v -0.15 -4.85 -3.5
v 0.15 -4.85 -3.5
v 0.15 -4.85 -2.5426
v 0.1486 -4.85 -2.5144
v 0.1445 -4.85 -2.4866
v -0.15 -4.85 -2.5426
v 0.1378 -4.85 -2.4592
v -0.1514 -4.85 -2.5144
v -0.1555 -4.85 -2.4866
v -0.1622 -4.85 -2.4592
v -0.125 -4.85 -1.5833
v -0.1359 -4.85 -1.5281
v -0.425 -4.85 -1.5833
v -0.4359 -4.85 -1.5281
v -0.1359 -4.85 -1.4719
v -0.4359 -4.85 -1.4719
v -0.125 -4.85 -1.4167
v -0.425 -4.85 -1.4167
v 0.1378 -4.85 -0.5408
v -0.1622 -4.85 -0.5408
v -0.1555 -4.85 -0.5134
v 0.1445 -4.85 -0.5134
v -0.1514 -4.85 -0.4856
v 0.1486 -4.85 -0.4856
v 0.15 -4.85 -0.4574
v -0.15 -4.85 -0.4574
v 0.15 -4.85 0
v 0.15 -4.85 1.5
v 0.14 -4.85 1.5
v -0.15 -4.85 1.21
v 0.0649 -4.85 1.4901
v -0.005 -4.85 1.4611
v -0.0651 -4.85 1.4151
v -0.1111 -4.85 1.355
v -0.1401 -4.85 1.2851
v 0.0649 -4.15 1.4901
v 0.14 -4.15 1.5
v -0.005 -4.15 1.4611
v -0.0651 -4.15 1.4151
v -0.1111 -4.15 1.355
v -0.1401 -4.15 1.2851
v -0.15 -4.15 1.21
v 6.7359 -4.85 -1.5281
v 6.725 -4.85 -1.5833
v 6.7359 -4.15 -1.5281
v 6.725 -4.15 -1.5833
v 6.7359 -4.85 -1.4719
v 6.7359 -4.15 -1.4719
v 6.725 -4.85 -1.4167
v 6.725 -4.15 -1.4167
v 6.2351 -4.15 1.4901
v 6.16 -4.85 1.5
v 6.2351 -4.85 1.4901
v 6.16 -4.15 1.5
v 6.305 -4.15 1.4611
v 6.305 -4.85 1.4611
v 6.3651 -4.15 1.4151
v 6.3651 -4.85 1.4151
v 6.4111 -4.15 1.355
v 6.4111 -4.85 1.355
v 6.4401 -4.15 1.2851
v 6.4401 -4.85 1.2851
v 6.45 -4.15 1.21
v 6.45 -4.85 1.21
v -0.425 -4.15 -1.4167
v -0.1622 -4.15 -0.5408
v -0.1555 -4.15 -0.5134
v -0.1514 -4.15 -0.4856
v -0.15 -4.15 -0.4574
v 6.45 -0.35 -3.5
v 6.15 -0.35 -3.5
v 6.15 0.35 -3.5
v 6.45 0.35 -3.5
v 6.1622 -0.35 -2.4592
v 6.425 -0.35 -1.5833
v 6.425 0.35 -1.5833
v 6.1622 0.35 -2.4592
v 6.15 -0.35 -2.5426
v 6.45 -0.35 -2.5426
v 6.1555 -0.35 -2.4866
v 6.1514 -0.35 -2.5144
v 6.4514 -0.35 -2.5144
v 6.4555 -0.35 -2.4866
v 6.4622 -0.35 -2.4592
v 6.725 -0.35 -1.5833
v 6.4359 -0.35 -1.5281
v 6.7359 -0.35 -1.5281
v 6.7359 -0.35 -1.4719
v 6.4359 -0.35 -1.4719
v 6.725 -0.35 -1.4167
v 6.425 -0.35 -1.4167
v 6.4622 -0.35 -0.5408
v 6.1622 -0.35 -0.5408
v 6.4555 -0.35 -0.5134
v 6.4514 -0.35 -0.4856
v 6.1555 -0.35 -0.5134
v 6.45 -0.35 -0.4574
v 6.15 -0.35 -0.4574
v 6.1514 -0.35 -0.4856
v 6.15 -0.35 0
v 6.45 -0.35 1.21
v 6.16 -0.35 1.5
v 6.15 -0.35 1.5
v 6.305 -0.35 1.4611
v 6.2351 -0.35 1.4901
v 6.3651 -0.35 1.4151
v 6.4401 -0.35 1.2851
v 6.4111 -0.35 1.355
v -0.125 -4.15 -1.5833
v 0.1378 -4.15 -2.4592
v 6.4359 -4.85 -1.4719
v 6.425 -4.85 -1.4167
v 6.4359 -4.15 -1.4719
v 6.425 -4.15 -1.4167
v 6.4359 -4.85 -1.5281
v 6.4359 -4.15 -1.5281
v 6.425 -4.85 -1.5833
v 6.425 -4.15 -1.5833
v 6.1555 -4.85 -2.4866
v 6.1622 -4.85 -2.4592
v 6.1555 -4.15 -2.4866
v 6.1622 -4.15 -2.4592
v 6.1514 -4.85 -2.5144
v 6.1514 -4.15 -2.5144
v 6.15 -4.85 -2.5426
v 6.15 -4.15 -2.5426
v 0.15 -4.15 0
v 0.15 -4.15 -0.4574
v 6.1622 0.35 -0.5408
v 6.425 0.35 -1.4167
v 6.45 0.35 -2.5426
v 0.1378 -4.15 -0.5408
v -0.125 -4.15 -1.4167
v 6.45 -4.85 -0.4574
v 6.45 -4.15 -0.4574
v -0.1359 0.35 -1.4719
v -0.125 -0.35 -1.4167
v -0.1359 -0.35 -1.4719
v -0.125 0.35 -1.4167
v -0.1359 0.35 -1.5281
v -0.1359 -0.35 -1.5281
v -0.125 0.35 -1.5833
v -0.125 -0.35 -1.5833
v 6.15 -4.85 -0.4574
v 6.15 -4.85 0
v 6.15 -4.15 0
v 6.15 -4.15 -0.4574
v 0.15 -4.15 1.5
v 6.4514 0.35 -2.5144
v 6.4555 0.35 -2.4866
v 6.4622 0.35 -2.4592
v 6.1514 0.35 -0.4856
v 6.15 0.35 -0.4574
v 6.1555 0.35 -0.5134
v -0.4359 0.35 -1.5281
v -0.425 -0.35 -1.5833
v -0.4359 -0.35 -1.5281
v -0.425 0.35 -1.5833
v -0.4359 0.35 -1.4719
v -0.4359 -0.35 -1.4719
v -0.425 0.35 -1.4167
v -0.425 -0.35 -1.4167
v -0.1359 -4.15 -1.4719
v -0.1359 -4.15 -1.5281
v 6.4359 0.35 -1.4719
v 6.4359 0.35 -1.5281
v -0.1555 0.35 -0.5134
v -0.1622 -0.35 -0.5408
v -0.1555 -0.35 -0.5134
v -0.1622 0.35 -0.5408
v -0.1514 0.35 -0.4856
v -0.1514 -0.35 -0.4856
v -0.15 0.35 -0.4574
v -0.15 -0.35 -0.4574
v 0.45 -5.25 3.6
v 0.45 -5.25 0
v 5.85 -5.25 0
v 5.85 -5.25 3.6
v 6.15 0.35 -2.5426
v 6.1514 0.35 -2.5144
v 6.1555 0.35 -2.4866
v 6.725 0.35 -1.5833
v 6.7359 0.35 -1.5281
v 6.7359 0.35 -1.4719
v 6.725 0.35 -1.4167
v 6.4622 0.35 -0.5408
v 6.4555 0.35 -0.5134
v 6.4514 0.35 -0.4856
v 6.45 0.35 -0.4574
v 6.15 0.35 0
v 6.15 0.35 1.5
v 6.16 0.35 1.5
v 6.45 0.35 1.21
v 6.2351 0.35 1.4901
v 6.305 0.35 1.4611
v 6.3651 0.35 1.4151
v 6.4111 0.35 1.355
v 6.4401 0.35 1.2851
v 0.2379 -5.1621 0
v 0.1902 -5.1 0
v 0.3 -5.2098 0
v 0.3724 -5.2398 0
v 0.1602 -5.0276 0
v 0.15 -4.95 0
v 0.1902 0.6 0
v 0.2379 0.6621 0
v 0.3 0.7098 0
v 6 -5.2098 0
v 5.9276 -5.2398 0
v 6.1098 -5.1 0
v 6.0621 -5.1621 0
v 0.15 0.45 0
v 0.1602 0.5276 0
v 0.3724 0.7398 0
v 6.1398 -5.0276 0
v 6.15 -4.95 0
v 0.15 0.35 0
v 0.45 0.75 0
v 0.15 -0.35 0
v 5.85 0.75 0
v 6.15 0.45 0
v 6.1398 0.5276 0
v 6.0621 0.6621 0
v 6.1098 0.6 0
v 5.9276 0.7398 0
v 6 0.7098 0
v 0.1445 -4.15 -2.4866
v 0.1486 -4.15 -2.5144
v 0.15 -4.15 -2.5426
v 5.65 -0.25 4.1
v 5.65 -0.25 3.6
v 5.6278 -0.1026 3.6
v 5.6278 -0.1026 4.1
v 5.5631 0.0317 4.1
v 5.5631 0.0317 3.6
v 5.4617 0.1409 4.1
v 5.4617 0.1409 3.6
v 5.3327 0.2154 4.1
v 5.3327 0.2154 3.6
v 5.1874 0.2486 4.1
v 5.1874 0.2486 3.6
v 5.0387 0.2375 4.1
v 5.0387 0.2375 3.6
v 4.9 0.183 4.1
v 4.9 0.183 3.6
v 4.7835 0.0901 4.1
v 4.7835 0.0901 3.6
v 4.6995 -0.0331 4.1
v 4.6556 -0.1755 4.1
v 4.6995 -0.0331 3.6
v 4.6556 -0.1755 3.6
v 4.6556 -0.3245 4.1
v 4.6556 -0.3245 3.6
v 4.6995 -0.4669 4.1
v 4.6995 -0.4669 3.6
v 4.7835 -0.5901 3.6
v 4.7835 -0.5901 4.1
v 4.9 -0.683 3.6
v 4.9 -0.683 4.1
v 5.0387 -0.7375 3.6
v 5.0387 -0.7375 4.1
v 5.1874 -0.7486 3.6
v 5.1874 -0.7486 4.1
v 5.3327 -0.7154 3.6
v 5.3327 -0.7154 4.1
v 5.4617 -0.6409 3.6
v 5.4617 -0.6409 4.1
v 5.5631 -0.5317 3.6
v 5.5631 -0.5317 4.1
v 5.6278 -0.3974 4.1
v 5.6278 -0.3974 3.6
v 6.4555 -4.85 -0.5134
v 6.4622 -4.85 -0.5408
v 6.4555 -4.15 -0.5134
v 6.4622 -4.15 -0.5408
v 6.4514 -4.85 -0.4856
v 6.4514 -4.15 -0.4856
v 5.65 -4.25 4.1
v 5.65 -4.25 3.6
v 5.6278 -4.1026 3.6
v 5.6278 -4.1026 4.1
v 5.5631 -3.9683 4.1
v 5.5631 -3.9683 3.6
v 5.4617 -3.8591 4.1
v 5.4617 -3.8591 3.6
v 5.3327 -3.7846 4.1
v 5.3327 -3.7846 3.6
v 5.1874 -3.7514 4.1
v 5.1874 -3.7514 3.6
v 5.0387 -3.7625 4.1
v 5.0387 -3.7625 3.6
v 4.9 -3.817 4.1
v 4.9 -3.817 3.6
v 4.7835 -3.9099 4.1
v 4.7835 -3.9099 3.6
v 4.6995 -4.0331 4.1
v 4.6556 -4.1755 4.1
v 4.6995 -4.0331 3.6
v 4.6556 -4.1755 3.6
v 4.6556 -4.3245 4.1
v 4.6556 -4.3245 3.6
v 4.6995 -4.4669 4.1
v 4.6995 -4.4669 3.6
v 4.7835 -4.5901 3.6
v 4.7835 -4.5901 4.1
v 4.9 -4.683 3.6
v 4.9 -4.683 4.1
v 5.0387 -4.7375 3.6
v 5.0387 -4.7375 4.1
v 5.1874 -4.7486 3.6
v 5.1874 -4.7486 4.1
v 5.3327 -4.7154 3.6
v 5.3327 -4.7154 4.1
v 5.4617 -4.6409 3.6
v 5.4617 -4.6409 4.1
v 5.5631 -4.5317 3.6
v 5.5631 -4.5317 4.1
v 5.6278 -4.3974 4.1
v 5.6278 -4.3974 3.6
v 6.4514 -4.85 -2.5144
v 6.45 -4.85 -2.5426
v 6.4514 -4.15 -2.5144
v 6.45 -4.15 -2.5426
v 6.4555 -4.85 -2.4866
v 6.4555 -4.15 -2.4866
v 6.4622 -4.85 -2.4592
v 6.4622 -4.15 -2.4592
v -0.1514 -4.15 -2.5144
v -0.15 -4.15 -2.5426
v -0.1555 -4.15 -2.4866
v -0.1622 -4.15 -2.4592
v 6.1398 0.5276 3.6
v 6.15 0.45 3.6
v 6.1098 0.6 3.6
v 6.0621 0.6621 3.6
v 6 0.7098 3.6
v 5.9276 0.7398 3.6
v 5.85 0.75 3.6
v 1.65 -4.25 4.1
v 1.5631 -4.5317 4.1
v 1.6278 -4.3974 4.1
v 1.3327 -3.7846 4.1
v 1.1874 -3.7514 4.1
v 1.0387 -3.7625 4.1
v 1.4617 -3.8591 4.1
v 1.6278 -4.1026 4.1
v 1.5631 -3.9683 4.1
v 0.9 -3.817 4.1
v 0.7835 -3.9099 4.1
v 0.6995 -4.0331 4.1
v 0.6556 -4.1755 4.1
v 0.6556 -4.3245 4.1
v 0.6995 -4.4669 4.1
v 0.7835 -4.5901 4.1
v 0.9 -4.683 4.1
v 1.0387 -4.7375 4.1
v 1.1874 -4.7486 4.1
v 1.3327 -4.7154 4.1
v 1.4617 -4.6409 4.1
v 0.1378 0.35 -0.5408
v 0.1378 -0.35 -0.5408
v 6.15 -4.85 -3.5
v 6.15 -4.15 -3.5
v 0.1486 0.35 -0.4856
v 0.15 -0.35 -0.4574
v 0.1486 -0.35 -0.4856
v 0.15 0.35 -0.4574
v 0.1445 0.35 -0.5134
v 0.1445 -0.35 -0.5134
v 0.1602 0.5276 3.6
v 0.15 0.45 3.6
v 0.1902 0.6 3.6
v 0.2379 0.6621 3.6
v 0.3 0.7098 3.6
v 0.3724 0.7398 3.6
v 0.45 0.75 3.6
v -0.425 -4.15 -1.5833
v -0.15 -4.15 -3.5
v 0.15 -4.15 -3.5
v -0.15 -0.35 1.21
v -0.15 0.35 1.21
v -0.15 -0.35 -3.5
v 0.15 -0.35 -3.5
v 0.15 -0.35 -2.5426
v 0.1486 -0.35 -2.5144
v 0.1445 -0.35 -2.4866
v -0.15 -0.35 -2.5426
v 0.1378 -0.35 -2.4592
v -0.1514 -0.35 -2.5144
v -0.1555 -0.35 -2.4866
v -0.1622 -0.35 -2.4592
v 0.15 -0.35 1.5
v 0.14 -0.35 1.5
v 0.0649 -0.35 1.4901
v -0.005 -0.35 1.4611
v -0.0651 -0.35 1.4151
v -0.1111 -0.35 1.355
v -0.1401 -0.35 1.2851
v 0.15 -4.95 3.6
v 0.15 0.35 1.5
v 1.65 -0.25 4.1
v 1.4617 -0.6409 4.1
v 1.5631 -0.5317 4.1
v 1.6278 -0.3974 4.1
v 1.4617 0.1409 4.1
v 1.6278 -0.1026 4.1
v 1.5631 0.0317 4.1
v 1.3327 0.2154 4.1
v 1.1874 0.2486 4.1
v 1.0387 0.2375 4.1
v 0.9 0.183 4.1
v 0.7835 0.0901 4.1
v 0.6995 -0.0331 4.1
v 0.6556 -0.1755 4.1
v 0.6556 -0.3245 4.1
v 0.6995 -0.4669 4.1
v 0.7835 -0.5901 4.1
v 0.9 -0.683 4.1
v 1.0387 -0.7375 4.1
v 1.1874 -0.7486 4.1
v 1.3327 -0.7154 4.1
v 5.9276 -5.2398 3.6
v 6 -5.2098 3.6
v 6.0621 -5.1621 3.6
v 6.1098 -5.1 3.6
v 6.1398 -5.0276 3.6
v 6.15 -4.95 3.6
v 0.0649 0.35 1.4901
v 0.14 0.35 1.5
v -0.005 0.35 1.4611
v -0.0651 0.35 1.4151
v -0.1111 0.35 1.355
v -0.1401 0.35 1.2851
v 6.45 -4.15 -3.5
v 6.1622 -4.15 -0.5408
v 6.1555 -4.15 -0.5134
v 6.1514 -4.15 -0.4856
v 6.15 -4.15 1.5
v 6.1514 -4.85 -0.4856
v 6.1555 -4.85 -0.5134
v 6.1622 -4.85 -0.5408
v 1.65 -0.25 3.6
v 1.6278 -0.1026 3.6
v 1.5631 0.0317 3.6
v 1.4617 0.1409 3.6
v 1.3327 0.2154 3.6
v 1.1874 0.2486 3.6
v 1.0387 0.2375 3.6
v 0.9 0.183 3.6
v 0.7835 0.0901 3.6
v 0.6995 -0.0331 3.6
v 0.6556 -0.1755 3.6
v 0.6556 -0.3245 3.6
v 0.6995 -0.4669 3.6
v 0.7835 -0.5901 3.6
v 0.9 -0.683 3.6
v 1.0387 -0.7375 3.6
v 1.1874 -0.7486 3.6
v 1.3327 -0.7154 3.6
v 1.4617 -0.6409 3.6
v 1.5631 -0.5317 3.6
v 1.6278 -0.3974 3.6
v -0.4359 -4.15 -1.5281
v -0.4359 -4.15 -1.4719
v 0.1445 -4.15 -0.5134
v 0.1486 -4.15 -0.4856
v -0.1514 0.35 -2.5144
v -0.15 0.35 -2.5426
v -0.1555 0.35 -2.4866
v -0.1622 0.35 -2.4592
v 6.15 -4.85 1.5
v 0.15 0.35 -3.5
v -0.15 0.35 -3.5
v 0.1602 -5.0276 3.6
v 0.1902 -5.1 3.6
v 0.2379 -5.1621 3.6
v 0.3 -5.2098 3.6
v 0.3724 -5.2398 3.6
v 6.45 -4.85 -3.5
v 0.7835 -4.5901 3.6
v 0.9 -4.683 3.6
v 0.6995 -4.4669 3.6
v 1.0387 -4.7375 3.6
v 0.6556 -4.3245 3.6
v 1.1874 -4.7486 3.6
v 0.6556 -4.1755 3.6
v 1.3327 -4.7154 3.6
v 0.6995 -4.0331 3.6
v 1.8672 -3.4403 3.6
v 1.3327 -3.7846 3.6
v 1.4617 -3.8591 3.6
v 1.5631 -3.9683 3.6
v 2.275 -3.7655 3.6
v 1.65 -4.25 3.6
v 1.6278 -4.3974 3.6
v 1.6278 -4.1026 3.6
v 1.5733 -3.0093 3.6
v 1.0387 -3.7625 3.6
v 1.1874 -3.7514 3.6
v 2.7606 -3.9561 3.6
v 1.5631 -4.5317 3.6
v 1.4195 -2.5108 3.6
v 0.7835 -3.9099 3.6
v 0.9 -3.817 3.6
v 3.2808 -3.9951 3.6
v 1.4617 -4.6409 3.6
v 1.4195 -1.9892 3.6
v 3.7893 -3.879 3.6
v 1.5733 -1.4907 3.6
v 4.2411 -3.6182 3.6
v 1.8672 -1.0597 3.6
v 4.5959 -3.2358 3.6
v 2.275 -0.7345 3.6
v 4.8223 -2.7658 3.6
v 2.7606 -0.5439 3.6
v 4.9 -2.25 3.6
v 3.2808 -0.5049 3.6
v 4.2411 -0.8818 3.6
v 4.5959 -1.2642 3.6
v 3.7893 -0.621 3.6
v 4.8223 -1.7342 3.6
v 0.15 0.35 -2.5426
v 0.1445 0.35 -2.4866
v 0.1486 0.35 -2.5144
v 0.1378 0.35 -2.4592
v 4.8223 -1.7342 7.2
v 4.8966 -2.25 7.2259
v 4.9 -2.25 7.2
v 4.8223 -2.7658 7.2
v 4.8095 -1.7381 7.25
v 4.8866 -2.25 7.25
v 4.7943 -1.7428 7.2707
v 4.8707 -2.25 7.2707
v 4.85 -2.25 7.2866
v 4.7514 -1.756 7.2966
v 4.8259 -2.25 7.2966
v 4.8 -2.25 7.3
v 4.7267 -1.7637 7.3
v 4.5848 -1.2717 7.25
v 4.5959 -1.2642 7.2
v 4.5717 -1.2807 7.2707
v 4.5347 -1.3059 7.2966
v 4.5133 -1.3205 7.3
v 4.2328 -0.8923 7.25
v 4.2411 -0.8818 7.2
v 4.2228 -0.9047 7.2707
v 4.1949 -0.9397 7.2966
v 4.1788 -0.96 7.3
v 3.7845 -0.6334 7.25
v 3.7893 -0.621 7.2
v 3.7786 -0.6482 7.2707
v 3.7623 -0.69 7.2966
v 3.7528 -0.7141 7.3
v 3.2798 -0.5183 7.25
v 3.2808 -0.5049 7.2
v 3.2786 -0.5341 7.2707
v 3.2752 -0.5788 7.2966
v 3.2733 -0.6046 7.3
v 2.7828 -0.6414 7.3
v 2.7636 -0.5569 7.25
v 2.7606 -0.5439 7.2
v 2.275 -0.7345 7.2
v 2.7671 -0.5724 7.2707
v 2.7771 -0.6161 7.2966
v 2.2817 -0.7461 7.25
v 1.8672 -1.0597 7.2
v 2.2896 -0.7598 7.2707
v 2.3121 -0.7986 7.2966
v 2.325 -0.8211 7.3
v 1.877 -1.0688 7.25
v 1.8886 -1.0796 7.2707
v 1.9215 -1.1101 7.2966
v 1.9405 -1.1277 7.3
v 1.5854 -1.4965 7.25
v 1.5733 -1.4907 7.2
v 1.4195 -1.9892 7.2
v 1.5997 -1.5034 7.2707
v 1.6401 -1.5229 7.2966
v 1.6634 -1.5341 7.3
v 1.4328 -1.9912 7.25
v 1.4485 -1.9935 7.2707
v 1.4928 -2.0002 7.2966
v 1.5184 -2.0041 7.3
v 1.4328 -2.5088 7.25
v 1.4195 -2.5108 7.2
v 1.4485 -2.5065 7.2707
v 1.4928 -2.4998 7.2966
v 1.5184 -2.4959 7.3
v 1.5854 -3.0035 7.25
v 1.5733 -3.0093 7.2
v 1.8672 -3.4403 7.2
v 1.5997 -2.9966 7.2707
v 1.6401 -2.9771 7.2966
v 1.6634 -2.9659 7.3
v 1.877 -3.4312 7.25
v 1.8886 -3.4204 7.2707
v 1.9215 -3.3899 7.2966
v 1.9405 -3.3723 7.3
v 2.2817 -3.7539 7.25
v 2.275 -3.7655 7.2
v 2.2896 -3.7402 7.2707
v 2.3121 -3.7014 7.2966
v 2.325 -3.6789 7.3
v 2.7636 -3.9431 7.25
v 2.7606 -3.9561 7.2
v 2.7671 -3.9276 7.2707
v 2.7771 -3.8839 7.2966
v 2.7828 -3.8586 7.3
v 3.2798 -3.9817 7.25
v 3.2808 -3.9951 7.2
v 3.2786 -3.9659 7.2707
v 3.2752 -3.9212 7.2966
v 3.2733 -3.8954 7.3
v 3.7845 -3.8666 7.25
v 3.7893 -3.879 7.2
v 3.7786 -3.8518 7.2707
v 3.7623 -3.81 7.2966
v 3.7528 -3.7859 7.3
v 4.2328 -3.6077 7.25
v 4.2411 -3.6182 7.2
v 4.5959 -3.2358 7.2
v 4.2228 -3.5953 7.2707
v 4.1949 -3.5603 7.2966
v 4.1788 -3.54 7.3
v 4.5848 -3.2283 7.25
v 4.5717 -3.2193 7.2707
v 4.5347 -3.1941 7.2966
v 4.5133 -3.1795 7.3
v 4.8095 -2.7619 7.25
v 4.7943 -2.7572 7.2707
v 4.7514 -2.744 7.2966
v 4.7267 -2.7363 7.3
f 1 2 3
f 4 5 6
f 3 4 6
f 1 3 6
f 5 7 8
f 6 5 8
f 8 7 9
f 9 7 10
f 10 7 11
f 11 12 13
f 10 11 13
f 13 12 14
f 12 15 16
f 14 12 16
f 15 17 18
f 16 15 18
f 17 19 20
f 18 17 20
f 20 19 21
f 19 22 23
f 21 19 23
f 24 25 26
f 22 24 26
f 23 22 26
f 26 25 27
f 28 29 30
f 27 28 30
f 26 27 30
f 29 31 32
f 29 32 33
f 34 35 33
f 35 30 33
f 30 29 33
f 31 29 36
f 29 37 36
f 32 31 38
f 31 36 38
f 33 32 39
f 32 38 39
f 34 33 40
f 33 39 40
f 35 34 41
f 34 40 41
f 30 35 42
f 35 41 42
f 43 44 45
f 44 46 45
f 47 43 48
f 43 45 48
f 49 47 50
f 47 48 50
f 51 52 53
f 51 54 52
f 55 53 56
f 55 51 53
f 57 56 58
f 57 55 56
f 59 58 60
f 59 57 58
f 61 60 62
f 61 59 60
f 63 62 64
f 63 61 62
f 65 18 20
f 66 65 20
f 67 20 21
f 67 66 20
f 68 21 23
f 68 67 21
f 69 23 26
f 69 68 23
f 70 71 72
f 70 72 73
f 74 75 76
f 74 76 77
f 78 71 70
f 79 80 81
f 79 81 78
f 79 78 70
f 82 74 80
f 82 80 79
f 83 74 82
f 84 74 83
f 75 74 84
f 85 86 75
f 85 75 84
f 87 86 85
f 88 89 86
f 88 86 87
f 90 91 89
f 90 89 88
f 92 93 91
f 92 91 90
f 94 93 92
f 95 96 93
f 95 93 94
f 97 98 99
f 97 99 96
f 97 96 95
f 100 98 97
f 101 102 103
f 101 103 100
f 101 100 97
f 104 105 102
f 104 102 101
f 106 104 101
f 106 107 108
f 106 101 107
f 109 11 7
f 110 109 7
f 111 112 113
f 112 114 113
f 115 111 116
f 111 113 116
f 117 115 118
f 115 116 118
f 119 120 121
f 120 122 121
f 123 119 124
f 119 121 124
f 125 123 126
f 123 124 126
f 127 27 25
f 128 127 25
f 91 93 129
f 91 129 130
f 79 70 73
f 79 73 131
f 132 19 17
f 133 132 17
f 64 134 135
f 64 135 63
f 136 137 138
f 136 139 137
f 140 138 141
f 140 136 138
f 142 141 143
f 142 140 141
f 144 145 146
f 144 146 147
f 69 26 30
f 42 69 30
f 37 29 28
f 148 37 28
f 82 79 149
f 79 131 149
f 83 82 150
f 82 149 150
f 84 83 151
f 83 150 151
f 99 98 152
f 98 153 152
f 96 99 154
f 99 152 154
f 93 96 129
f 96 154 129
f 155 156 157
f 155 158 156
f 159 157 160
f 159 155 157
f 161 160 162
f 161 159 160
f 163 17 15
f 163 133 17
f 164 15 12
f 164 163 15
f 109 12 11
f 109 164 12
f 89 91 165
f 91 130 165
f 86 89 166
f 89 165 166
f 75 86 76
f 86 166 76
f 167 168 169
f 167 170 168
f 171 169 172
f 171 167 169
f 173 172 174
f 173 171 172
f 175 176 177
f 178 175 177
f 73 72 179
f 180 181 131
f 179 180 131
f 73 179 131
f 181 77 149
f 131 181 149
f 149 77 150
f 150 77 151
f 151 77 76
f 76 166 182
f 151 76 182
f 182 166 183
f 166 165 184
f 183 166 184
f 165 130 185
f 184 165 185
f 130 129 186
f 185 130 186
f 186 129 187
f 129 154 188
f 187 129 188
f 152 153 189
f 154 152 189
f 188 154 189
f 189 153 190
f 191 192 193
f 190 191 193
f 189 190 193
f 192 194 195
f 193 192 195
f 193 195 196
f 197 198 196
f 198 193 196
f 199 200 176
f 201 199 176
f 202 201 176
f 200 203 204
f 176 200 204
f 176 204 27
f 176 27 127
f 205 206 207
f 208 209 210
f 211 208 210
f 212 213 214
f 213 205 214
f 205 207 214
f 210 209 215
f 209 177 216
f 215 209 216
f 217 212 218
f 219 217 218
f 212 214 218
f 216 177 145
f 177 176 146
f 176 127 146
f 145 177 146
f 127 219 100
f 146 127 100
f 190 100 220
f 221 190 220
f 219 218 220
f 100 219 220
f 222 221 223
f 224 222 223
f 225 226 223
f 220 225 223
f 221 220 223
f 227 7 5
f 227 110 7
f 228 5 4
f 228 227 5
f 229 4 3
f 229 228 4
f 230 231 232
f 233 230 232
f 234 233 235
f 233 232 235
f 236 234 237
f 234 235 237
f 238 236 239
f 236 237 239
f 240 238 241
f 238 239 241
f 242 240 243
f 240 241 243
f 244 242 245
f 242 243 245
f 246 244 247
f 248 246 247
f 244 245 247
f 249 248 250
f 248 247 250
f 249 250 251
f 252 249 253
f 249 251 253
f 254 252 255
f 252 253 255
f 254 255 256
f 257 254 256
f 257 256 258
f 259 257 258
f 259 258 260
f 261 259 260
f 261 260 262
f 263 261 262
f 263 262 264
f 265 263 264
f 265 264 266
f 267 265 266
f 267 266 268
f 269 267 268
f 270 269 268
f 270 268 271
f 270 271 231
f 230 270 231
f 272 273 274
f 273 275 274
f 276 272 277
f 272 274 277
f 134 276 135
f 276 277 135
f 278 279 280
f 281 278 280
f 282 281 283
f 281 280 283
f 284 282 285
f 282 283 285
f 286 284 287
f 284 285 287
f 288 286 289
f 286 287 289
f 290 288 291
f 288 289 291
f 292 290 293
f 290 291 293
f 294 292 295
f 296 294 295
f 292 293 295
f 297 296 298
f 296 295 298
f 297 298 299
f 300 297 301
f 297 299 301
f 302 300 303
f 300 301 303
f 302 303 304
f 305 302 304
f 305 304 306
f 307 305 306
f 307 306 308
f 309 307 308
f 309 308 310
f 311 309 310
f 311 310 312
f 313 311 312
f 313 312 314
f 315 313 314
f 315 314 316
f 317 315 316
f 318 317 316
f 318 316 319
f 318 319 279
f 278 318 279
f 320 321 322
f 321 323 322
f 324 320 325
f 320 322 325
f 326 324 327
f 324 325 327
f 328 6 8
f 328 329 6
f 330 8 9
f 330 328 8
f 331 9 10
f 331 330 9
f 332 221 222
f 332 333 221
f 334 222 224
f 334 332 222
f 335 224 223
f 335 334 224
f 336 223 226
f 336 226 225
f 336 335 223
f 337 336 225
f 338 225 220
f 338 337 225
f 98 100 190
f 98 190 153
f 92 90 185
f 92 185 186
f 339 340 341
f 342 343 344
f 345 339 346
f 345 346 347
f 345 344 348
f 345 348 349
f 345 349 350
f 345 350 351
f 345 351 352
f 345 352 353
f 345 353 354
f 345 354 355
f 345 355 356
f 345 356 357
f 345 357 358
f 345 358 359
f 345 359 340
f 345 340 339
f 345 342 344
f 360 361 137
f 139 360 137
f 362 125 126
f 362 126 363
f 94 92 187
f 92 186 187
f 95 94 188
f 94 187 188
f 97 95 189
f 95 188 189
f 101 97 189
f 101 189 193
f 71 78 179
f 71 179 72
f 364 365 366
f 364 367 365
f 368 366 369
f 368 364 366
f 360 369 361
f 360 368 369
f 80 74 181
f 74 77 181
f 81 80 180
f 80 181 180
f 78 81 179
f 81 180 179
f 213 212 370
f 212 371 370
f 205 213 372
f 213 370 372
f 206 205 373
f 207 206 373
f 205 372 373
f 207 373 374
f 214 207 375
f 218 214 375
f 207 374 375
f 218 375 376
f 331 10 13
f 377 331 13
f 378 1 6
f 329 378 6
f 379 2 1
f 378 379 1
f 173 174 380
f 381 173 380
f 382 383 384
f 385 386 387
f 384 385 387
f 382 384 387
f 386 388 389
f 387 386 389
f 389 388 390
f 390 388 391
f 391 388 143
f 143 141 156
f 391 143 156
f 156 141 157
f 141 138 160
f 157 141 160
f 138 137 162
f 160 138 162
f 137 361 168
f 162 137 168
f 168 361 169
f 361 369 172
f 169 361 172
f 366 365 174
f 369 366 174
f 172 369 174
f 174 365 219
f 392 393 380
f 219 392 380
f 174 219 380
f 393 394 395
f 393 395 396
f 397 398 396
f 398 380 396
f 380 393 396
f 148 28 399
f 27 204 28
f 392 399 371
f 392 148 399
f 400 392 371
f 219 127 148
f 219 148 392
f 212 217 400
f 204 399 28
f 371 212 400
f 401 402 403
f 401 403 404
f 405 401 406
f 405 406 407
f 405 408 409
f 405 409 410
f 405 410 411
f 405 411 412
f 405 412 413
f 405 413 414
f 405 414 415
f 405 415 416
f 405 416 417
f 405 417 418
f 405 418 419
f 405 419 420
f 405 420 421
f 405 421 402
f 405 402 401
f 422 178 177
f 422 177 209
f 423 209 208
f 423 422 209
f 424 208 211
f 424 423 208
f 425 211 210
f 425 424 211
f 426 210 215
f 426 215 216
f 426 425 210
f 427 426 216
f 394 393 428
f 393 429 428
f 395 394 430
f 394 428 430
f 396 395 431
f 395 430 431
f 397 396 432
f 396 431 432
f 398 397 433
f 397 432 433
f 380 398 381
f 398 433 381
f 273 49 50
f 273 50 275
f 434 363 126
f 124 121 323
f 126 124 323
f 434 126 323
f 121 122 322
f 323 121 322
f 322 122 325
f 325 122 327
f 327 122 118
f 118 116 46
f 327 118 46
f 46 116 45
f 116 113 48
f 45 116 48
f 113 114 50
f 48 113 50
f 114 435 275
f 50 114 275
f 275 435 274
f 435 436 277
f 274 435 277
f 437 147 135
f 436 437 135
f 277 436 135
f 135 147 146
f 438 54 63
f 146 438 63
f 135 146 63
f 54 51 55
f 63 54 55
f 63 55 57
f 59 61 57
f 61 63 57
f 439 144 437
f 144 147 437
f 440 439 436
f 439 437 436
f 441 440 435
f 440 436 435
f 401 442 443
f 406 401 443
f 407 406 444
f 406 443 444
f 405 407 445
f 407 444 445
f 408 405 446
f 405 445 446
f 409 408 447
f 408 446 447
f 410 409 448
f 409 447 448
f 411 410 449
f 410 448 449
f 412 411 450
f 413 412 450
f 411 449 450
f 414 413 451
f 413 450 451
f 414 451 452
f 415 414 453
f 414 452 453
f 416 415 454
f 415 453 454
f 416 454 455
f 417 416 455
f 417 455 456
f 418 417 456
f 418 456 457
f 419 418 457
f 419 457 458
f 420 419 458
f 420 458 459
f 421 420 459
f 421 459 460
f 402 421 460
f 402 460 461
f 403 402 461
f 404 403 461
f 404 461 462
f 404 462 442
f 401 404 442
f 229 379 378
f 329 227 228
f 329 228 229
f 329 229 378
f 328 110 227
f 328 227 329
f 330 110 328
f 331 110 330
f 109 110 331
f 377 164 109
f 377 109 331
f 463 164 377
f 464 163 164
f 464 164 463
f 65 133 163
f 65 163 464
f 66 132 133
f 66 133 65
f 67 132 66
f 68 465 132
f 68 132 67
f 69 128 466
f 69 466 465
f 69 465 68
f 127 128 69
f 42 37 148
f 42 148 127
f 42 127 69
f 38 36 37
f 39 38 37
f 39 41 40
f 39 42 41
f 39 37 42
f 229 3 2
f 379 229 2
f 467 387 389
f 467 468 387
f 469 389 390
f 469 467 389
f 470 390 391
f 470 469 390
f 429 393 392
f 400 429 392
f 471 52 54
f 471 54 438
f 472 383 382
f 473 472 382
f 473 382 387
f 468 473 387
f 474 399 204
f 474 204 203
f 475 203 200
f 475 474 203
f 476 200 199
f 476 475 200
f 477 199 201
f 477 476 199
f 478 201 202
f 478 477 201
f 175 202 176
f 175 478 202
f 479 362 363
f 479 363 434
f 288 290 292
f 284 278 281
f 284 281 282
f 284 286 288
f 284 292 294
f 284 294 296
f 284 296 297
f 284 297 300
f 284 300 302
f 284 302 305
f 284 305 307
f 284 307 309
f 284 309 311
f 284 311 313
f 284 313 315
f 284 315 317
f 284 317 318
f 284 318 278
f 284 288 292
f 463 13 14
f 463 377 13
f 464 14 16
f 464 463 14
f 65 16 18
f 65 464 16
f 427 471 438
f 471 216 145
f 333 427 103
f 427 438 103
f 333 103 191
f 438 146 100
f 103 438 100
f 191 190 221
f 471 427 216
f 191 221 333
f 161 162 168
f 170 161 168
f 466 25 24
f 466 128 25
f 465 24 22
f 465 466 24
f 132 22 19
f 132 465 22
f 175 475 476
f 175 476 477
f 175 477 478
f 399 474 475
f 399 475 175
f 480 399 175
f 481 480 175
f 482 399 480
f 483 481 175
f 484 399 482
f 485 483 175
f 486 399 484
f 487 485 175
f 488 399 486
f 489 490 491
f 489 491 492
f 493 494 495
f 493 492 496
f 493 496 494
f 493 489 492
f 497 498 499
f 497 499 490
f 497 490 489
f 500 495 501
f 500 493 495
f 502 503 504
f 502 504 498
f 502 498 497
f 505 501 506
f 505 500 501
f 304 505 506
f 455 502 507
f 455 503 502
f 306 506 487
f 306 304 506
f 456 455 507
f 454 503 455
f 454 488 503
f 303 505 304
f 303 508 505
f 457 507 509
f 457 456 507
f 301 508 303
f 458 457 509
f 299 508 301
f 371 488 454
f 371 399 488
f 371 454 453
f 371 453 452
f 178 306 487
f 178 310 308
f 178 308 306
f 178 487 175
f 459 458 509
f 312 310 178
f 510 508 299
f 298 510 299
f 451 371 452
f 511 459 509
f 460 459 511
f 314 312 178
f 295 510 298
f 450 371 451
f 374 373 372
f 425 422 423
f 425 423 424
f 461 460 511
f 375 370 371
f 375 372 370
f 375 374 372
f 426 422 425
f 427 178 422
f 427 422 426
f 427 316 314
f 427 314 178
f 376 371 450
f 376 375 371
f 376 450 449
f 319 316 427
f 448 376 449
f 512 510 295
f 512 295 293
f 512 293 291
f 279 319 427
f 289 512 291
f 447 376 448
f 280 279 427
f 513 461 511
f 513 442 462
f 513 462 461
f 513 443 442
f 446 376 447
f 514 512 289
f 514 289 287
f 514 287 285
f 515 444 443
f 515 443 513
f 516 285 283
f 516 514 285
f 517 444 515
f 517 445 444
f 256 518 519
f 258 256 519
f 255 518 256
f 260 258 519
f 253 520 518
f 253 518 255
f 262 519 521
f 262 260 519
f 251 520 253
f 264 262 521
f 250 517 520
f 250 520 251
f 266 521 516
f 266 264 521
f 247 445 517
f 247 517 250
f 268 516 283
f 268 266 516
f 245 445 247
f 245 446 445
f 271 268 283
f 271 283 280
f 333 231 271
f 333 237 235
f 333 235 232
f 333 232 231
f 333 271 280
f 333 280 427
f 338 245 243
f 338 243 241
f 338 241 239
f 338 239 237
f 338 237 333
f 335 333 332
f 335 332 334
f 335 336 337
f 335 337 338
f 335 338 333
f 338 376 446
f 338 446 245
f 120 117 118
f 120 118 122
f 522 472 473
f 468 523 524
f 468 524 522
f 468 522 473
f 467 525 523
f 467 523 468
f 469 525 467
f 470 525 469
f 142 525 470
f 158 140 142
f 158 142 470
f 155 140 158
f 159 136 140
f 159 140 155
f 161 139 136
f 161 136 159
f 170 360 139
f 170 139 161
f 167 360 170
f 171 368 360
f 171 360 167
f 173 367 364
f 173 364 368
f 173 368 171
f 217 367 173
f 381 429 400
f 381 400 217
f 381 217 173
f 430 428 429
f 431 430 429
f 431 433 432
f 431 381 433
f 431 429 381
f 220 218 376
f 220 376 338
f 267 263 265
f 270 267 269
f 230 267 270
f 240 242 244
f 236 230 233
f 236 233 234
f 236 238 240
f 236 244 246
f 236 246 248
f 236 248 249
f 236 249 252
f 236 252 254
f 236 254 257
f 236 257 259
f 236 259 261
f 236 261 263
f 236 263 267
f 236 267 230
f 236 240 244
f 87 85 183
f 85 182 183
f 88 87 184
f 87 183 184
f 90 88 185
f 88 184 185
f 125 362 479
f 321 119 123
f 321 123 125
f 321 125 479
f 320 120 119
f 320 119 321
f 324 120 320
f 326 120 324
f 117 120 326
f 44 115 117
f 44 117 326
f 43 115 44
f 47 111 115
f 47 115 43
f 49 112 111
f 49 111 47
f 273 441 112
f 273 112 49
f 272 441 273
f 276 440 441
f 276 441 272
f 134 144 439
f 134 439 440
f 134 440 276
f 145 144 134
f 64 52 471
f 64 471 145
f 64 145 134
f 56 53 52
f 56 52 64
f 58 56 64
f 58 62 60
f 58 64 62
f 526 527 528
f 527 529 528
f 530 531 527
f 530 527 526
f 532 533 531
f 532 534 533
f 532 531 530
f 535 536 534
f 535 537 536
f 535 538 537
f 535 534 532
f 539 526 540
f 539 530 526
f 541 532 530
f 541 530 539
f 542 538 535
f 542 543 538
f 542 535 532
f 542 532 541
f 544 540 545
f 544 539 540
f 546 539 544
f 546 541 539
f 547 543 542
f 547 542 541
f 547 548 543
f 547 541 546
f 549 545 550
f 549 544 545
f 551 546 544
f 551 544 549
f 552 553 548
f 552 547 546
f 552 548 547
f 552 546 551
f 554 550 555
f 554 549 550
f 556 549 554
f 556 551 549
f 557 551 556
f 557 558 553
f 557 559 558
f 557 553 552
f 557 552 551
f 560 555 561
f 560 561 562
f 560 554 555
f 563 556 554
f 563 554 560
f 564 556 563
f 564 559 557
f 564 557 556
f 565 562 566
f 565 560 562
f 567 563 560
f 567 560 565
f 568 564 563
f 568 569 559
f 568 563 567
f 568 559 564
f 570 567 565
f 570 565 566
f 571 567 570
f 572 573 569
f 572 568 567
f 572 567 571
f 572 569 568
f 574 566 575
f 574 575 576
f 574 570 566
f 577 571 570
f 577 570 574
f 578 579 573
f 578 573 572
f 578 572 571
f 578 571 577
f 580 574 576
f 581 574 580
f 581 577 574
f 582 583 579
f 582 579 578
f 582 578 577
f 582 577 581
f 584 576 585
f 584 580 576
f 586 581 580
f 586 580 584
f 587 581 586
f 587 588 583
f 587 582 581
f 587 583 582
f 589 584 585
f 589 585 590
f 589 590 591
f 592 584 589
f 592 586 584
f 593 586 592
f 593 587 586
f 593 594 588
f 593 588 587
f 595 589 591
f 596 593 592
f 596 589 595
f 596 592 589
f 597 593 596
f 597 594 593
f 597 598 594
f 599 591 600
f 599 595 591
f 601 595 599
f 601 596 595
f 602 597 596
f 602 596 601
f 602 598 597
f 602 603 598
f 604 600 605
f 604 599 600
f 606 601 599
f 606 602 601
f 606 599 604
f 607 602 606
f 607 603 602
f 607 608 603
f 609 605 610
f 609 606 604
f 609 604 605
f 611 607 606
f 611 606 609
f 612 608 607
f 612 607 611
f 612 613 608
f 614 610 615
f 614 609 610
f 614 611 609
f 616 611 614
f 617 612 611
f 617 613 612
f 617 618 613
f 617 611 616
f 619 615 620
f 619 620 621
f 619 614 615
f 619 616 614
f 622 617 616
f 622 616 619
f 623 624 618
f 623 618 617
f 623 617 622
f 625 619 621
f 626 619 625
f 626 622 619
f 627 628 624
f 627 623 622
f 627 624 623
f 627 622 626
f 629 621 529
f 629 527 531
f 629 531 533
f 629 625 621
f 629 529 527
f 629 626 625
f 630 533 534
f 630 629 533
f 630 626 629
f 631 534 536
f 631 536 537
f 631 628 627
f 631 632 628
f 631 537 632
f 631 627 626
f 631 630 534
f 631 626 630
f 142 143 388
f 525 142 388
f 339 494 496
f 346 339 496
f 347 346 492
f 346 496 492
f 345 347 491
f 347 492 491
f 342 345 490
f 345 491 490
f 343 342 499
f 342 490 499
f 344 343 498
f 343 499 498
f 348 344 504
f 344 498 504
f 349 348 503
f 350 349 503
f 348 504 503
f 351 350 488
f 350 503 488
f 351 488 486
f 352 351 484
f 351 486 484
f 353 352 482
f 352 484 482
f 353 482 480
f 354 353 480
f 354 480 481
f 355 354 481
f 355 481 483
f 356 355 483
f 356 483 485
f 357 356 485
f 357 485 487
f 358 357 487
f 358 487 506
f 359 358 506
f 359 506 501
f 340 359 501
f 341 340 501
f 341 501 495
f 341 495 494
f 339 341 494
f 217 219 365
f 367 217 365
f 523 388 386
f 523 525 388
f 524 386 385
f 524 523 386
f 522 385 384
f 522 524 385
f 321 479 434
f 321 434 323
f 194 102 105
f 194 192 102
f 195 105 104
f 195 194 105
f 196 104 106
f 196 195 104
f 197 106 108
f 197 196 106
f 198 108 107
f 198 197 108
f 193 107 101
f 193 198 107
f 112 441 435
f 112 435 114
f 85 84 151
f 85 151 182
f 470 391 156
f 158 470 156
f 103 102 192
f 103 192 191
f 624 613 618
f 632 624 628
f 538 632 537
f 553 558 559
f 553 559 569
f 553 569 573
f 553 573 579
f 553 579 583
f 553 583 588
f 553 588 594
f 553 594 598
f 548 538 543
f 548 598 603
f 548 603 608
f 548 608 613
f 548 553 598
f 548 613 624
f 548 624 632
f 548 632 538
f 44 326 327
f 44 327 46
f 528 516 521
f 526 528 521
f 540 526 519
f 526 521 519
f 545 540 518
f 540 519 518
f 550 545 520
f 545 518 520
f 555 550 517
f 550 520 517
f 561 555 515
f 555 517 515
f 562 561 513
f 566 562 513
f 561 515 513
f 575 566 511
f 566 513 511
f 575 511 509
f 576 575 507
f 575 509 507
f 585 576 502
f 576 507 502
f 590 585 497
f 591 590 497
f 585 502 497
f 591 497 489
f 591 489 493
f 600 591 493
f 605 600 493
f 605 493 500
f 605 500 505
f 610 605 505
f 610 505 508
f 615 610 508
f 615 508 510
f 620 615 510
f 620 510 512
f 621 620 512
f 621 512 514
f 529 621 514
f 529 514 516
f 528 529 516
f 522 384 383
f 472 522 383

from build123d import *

# Parameters (mm, degrees)
SKETCH001_W  = 6
SKETCH001_H  = 6
PAD001_DEPTH = 0.1
FILLET001_R  = 0.3
PAD008_DEPTH = 0.7
FILLET003_R  = 0.29
PAD009_DEPTH = 0.7
FILLET004_R  = 0.29
PAD010_DEPTH = 0.7
FILLET005_R  = 0.29
SKETCH_W     = 6
SKETCH_H     = 6
PAD_DEPTH    = 3.5
FILLET_R     = 0.3
SKETCH004_R  = 0.5
PAD003_DEPTH = 0.6
SKETCH003_R  = 0.5
PAD004_DEPTH = 0.6
SKETCH005_R  = 0.5
PAD002_DEPTH = 0.6
SKETCH002_R  = 0.5
PAD005_DEPTH = 0.6
SKETCH006_R  = 1.75
PAD006_DEPTH = 3.8
FILLET006_R  = 0.1
PAD007_DEPTH = 0.7
FILLET002_R  = 0.29


with BuildPart() as fillet001:
    # Sketch001 → Pad001 (new body)
    with BuildSketch(Plane.XY.offset(3.5)):
        with Locations((3.15, -2.25)):
            Rectangle(SKETCH001_W, SKETCH001_H)
    extrude(amount=PAD001_DEPTH)

    # Fillet001
    fillet001_edges = [fillet001.edges().sort_by_distance(p)[0] for p in [
        (6.15, -5.25, 3.55),
        (0.15, -5.25, 3.55),
        (6.15, 0.75, 3.55),
        (0.15, 0.75, 3.55),
    ]]
    fillet(fillet001_edges, radius=FILLET001_R)


with BuildPart() as fillet003:
    # Sketch008 → Pad008 (new body)
    with BuildSketch(Plane.XZ.offset(0.35)):
        Polygon((-0.15, 1.5), (0.15, 1.5), (0.15, -0.5), (-0.15, -1.5), (0.15, -2.5), (0.15, -3.5), (-0.15, -3.5), (-0.15, -2.5), (-0.45, -1.5), (-0.15, -0.5), align=None)
    extrude(amount=-PAD008_DEPTH)

    # Fillet003
    fillet003_edges = [fillet003.edges().sort_by_distance(p)[0] for p in [
        (-0.15, 0, -2.5),
        (-0.15, 0, -0.5),
        (-0.45, 0, -1.5),
        (-0.15, 0, 1.5),
        (0.15, 0, -0.5),
        (-0.15, 0, -1.5),
        (0.15, 0, -2.5),
    ]]
    fillet(fillet003_edges, radius=FILLET003_R)


with BuildPart() as fillet004:
    # Sketch009 → Pad009 (new body)
    with BuildSketch(Plane.XZ.offset(4.85)):
        Polygon((6.45, 1.5), (6.15, 1.5), (6.15, -0.5), (6.45, -1.5), (6.15, -2.5), (6.15, -3.5), (6.45, -3.5), (6.45, -2.5), (6.75, -1.5), (6.45, -0.5), align=None)
    extrude(amount=-PAD009_DEPTH)

    # Fillet004
    fillet004_edges = [fillet004.edges().sort_by_distance(p)[0] for p in [
        (6.45, -4.5, -2.5),
        (6.45, -4.5, -0.5),
        (6.75, -4.5, -1.5),
        (6.45, -4.5, 1.5),
        (6.15, -4.5, -0.5),
        (6.45, -4.5, -1.5),
        (6.15, -4.5, -2.5),
    ]]
    fillet(fillet004_edges, radius=FILLET004_R)


with BuildPart() as fillet005:
    # Sketch010 → Pad010 (new body)
    with BuildSketch(Plane.XZ.offset(0.35)):
        Polygon((6.45, 1.5), (6.15, 1.5), (6.15, -0.5), (6.45, -1.5), (6.15, -2.5), (6.15, -3.5), (6.45, -3.5), (6.45, -2.5), (6.75, -1.5), (6.45, -0.5), align=None)
    extrude(amount=-PAD010_DEPTH)

    # Fillet005
    fillet005_edges = [fillet005.edges().sort_by_distance(p)[0] for p in [
        (6.45, 0, -2.5),
        (6.45, 0, -0.5),
        (6.75, 0, -1.5),
        (6.45, 0, 1.5),
        (6.15, 0, -0.5),
        (6.45, 0, -1.5),
        (6.15, 0, -2.5),
    ]]
    fillet(fillet005_edges, radius=FILLET005_R)


with BuildPart() as fillet_body:
    # Sketch → Pad (new body)
    with BuildSketch(Plane.XY):
        with Locations((3.15, -2.25)):
            Rectangle(SKETCH_W, SKETCH_H)
    extrude(amount=PAD_DEPTH)

    # Fillet
    fillet_edges = [fillet_body.edges().sort_by_distance(p)[0] for p in [
        (6.15, 0.75, 1.75),
        (6.15, -5.25, 1.75),
        (0.15, -5.25, 1.75),
        (0.15, 0.75, 1.75),
    ]]
    fillet(fillet_edges, radius=FILLET_R)


with BuildPart() as pad003:
    # Pad003 base: copy of Fillet body
    add(fillet_body.part)

    # Sketch004 → Pad003 (new body)
    with BuildSketch(Plane.XY.offset(3.5)):
        with Locations((5.15, -0.25)):
            Circle(SKETCH004_R)
    extrude(amount=PAD003_DEPTH)


with BuildPart() as pad004:
    # Pad004 base: copy of Fillet body
    add(fillet_body.part)

    # Sketch003 → Pad004 (new body)
    with BuildSketch(Plane.XY.offset(3.5)):
        with Locations((5.15, -4.25)):
            Circle(SKETCH003_R)
    extrude(amount=PAD004_DEPTH)


with BuildPart() as pad002:
    # Pad002 base: copy of Fillet body
    add(fillet_body.part)

    # Sketch005 → Pad002 (new body)
    with BuildSketch(Plane.XY.offset(3.5)):
        with Locations((1.15, -0.25)):
            Circle(SKETCH005_R)
    extrude(amount=PAD002_DEPTH)


with BuildPart() as pad005:
    # Pad005 base: copy of Fillet body
    add(fillet_body.part)

    # Sketch002 → Pad005 (new body)
    with BuildSketch(Plane.XY.offset(3.5)):
        with Locations((1.15, -4.25)):
            Circle(SKETCH002_R)
    extrude(amount=PAD005_DEPTH)


with BuildPart() as fillet006:
    # Pad006 base: copy of Fillet body
    add(fillet_body.part)

    # Sketch006 → Pad006 (new body)
    with BuildSketch(Plane.XY.offset(3.5)):
        with Locations((3.15, -2.25)):
            Circle(SKETCH006_R)
    extrude(amount=PAD006_DEPTH)

    # Fillet006
    fillet006_edges = [fillet006.edges().sort_by_distance(p)[0] for p in [
        (1.4, -2.25, 7.3),
    ]]
    fillet(fillet006_edges, radius=FILLET006_R)


with BuildPart() as sw_push_6mm_h7_3mm:
    # Sketch007 → Pad007 (new body)
    with BuildSketch(Plane.XZ.offset(4.85)):
        Polygon((-0.15, 1.5), (0.15, 1.5), (0.15, -0.5), (-0.15, -1.5), (0.15, -2.5), (0.15, -3.5), (-0.15, -3.5), (-0.15, -2.5), (-0.45, -1.5), (-0.15, -0.5), align=None)
    extrude(amount=-PAD007_DEPTH)

    # Fillet002
    fillet002_edges = [sw_push_6mm_h7_3mm.edges().sort_by_distance(p)[0] for p in [
        (-0.15, -4.5, -2.5),
        (-0.15, -4.5, -0.5),
        (-0.45, -4.5, -1.5),
        (-0.15, -4.5, 1.5),
        (0.15, -4.5, -0.5),
        (-0.15, -4.5, -1.5),
        (0.15, -4.5, -2.5),
    ]]
    fillet(fillet002_edges, radius=FILLET002_R)

    # Fillet002_mp_cp: union Fillet001, Fillet003, Fillet004, Fillet005, Pad003, Pad004, Pad002, Pad005, Fillet006
    add(fillet001.part)
    add(fillet003.part)
    add(fillet004.part)
    add(fillet005.part)
    add(pad003.part)
    add(pad004.part)
    add(pad002.part)
    add(pad005.part)
    add(fillet006.part)


solid = sw_push_6mm_h7_3mm.part
